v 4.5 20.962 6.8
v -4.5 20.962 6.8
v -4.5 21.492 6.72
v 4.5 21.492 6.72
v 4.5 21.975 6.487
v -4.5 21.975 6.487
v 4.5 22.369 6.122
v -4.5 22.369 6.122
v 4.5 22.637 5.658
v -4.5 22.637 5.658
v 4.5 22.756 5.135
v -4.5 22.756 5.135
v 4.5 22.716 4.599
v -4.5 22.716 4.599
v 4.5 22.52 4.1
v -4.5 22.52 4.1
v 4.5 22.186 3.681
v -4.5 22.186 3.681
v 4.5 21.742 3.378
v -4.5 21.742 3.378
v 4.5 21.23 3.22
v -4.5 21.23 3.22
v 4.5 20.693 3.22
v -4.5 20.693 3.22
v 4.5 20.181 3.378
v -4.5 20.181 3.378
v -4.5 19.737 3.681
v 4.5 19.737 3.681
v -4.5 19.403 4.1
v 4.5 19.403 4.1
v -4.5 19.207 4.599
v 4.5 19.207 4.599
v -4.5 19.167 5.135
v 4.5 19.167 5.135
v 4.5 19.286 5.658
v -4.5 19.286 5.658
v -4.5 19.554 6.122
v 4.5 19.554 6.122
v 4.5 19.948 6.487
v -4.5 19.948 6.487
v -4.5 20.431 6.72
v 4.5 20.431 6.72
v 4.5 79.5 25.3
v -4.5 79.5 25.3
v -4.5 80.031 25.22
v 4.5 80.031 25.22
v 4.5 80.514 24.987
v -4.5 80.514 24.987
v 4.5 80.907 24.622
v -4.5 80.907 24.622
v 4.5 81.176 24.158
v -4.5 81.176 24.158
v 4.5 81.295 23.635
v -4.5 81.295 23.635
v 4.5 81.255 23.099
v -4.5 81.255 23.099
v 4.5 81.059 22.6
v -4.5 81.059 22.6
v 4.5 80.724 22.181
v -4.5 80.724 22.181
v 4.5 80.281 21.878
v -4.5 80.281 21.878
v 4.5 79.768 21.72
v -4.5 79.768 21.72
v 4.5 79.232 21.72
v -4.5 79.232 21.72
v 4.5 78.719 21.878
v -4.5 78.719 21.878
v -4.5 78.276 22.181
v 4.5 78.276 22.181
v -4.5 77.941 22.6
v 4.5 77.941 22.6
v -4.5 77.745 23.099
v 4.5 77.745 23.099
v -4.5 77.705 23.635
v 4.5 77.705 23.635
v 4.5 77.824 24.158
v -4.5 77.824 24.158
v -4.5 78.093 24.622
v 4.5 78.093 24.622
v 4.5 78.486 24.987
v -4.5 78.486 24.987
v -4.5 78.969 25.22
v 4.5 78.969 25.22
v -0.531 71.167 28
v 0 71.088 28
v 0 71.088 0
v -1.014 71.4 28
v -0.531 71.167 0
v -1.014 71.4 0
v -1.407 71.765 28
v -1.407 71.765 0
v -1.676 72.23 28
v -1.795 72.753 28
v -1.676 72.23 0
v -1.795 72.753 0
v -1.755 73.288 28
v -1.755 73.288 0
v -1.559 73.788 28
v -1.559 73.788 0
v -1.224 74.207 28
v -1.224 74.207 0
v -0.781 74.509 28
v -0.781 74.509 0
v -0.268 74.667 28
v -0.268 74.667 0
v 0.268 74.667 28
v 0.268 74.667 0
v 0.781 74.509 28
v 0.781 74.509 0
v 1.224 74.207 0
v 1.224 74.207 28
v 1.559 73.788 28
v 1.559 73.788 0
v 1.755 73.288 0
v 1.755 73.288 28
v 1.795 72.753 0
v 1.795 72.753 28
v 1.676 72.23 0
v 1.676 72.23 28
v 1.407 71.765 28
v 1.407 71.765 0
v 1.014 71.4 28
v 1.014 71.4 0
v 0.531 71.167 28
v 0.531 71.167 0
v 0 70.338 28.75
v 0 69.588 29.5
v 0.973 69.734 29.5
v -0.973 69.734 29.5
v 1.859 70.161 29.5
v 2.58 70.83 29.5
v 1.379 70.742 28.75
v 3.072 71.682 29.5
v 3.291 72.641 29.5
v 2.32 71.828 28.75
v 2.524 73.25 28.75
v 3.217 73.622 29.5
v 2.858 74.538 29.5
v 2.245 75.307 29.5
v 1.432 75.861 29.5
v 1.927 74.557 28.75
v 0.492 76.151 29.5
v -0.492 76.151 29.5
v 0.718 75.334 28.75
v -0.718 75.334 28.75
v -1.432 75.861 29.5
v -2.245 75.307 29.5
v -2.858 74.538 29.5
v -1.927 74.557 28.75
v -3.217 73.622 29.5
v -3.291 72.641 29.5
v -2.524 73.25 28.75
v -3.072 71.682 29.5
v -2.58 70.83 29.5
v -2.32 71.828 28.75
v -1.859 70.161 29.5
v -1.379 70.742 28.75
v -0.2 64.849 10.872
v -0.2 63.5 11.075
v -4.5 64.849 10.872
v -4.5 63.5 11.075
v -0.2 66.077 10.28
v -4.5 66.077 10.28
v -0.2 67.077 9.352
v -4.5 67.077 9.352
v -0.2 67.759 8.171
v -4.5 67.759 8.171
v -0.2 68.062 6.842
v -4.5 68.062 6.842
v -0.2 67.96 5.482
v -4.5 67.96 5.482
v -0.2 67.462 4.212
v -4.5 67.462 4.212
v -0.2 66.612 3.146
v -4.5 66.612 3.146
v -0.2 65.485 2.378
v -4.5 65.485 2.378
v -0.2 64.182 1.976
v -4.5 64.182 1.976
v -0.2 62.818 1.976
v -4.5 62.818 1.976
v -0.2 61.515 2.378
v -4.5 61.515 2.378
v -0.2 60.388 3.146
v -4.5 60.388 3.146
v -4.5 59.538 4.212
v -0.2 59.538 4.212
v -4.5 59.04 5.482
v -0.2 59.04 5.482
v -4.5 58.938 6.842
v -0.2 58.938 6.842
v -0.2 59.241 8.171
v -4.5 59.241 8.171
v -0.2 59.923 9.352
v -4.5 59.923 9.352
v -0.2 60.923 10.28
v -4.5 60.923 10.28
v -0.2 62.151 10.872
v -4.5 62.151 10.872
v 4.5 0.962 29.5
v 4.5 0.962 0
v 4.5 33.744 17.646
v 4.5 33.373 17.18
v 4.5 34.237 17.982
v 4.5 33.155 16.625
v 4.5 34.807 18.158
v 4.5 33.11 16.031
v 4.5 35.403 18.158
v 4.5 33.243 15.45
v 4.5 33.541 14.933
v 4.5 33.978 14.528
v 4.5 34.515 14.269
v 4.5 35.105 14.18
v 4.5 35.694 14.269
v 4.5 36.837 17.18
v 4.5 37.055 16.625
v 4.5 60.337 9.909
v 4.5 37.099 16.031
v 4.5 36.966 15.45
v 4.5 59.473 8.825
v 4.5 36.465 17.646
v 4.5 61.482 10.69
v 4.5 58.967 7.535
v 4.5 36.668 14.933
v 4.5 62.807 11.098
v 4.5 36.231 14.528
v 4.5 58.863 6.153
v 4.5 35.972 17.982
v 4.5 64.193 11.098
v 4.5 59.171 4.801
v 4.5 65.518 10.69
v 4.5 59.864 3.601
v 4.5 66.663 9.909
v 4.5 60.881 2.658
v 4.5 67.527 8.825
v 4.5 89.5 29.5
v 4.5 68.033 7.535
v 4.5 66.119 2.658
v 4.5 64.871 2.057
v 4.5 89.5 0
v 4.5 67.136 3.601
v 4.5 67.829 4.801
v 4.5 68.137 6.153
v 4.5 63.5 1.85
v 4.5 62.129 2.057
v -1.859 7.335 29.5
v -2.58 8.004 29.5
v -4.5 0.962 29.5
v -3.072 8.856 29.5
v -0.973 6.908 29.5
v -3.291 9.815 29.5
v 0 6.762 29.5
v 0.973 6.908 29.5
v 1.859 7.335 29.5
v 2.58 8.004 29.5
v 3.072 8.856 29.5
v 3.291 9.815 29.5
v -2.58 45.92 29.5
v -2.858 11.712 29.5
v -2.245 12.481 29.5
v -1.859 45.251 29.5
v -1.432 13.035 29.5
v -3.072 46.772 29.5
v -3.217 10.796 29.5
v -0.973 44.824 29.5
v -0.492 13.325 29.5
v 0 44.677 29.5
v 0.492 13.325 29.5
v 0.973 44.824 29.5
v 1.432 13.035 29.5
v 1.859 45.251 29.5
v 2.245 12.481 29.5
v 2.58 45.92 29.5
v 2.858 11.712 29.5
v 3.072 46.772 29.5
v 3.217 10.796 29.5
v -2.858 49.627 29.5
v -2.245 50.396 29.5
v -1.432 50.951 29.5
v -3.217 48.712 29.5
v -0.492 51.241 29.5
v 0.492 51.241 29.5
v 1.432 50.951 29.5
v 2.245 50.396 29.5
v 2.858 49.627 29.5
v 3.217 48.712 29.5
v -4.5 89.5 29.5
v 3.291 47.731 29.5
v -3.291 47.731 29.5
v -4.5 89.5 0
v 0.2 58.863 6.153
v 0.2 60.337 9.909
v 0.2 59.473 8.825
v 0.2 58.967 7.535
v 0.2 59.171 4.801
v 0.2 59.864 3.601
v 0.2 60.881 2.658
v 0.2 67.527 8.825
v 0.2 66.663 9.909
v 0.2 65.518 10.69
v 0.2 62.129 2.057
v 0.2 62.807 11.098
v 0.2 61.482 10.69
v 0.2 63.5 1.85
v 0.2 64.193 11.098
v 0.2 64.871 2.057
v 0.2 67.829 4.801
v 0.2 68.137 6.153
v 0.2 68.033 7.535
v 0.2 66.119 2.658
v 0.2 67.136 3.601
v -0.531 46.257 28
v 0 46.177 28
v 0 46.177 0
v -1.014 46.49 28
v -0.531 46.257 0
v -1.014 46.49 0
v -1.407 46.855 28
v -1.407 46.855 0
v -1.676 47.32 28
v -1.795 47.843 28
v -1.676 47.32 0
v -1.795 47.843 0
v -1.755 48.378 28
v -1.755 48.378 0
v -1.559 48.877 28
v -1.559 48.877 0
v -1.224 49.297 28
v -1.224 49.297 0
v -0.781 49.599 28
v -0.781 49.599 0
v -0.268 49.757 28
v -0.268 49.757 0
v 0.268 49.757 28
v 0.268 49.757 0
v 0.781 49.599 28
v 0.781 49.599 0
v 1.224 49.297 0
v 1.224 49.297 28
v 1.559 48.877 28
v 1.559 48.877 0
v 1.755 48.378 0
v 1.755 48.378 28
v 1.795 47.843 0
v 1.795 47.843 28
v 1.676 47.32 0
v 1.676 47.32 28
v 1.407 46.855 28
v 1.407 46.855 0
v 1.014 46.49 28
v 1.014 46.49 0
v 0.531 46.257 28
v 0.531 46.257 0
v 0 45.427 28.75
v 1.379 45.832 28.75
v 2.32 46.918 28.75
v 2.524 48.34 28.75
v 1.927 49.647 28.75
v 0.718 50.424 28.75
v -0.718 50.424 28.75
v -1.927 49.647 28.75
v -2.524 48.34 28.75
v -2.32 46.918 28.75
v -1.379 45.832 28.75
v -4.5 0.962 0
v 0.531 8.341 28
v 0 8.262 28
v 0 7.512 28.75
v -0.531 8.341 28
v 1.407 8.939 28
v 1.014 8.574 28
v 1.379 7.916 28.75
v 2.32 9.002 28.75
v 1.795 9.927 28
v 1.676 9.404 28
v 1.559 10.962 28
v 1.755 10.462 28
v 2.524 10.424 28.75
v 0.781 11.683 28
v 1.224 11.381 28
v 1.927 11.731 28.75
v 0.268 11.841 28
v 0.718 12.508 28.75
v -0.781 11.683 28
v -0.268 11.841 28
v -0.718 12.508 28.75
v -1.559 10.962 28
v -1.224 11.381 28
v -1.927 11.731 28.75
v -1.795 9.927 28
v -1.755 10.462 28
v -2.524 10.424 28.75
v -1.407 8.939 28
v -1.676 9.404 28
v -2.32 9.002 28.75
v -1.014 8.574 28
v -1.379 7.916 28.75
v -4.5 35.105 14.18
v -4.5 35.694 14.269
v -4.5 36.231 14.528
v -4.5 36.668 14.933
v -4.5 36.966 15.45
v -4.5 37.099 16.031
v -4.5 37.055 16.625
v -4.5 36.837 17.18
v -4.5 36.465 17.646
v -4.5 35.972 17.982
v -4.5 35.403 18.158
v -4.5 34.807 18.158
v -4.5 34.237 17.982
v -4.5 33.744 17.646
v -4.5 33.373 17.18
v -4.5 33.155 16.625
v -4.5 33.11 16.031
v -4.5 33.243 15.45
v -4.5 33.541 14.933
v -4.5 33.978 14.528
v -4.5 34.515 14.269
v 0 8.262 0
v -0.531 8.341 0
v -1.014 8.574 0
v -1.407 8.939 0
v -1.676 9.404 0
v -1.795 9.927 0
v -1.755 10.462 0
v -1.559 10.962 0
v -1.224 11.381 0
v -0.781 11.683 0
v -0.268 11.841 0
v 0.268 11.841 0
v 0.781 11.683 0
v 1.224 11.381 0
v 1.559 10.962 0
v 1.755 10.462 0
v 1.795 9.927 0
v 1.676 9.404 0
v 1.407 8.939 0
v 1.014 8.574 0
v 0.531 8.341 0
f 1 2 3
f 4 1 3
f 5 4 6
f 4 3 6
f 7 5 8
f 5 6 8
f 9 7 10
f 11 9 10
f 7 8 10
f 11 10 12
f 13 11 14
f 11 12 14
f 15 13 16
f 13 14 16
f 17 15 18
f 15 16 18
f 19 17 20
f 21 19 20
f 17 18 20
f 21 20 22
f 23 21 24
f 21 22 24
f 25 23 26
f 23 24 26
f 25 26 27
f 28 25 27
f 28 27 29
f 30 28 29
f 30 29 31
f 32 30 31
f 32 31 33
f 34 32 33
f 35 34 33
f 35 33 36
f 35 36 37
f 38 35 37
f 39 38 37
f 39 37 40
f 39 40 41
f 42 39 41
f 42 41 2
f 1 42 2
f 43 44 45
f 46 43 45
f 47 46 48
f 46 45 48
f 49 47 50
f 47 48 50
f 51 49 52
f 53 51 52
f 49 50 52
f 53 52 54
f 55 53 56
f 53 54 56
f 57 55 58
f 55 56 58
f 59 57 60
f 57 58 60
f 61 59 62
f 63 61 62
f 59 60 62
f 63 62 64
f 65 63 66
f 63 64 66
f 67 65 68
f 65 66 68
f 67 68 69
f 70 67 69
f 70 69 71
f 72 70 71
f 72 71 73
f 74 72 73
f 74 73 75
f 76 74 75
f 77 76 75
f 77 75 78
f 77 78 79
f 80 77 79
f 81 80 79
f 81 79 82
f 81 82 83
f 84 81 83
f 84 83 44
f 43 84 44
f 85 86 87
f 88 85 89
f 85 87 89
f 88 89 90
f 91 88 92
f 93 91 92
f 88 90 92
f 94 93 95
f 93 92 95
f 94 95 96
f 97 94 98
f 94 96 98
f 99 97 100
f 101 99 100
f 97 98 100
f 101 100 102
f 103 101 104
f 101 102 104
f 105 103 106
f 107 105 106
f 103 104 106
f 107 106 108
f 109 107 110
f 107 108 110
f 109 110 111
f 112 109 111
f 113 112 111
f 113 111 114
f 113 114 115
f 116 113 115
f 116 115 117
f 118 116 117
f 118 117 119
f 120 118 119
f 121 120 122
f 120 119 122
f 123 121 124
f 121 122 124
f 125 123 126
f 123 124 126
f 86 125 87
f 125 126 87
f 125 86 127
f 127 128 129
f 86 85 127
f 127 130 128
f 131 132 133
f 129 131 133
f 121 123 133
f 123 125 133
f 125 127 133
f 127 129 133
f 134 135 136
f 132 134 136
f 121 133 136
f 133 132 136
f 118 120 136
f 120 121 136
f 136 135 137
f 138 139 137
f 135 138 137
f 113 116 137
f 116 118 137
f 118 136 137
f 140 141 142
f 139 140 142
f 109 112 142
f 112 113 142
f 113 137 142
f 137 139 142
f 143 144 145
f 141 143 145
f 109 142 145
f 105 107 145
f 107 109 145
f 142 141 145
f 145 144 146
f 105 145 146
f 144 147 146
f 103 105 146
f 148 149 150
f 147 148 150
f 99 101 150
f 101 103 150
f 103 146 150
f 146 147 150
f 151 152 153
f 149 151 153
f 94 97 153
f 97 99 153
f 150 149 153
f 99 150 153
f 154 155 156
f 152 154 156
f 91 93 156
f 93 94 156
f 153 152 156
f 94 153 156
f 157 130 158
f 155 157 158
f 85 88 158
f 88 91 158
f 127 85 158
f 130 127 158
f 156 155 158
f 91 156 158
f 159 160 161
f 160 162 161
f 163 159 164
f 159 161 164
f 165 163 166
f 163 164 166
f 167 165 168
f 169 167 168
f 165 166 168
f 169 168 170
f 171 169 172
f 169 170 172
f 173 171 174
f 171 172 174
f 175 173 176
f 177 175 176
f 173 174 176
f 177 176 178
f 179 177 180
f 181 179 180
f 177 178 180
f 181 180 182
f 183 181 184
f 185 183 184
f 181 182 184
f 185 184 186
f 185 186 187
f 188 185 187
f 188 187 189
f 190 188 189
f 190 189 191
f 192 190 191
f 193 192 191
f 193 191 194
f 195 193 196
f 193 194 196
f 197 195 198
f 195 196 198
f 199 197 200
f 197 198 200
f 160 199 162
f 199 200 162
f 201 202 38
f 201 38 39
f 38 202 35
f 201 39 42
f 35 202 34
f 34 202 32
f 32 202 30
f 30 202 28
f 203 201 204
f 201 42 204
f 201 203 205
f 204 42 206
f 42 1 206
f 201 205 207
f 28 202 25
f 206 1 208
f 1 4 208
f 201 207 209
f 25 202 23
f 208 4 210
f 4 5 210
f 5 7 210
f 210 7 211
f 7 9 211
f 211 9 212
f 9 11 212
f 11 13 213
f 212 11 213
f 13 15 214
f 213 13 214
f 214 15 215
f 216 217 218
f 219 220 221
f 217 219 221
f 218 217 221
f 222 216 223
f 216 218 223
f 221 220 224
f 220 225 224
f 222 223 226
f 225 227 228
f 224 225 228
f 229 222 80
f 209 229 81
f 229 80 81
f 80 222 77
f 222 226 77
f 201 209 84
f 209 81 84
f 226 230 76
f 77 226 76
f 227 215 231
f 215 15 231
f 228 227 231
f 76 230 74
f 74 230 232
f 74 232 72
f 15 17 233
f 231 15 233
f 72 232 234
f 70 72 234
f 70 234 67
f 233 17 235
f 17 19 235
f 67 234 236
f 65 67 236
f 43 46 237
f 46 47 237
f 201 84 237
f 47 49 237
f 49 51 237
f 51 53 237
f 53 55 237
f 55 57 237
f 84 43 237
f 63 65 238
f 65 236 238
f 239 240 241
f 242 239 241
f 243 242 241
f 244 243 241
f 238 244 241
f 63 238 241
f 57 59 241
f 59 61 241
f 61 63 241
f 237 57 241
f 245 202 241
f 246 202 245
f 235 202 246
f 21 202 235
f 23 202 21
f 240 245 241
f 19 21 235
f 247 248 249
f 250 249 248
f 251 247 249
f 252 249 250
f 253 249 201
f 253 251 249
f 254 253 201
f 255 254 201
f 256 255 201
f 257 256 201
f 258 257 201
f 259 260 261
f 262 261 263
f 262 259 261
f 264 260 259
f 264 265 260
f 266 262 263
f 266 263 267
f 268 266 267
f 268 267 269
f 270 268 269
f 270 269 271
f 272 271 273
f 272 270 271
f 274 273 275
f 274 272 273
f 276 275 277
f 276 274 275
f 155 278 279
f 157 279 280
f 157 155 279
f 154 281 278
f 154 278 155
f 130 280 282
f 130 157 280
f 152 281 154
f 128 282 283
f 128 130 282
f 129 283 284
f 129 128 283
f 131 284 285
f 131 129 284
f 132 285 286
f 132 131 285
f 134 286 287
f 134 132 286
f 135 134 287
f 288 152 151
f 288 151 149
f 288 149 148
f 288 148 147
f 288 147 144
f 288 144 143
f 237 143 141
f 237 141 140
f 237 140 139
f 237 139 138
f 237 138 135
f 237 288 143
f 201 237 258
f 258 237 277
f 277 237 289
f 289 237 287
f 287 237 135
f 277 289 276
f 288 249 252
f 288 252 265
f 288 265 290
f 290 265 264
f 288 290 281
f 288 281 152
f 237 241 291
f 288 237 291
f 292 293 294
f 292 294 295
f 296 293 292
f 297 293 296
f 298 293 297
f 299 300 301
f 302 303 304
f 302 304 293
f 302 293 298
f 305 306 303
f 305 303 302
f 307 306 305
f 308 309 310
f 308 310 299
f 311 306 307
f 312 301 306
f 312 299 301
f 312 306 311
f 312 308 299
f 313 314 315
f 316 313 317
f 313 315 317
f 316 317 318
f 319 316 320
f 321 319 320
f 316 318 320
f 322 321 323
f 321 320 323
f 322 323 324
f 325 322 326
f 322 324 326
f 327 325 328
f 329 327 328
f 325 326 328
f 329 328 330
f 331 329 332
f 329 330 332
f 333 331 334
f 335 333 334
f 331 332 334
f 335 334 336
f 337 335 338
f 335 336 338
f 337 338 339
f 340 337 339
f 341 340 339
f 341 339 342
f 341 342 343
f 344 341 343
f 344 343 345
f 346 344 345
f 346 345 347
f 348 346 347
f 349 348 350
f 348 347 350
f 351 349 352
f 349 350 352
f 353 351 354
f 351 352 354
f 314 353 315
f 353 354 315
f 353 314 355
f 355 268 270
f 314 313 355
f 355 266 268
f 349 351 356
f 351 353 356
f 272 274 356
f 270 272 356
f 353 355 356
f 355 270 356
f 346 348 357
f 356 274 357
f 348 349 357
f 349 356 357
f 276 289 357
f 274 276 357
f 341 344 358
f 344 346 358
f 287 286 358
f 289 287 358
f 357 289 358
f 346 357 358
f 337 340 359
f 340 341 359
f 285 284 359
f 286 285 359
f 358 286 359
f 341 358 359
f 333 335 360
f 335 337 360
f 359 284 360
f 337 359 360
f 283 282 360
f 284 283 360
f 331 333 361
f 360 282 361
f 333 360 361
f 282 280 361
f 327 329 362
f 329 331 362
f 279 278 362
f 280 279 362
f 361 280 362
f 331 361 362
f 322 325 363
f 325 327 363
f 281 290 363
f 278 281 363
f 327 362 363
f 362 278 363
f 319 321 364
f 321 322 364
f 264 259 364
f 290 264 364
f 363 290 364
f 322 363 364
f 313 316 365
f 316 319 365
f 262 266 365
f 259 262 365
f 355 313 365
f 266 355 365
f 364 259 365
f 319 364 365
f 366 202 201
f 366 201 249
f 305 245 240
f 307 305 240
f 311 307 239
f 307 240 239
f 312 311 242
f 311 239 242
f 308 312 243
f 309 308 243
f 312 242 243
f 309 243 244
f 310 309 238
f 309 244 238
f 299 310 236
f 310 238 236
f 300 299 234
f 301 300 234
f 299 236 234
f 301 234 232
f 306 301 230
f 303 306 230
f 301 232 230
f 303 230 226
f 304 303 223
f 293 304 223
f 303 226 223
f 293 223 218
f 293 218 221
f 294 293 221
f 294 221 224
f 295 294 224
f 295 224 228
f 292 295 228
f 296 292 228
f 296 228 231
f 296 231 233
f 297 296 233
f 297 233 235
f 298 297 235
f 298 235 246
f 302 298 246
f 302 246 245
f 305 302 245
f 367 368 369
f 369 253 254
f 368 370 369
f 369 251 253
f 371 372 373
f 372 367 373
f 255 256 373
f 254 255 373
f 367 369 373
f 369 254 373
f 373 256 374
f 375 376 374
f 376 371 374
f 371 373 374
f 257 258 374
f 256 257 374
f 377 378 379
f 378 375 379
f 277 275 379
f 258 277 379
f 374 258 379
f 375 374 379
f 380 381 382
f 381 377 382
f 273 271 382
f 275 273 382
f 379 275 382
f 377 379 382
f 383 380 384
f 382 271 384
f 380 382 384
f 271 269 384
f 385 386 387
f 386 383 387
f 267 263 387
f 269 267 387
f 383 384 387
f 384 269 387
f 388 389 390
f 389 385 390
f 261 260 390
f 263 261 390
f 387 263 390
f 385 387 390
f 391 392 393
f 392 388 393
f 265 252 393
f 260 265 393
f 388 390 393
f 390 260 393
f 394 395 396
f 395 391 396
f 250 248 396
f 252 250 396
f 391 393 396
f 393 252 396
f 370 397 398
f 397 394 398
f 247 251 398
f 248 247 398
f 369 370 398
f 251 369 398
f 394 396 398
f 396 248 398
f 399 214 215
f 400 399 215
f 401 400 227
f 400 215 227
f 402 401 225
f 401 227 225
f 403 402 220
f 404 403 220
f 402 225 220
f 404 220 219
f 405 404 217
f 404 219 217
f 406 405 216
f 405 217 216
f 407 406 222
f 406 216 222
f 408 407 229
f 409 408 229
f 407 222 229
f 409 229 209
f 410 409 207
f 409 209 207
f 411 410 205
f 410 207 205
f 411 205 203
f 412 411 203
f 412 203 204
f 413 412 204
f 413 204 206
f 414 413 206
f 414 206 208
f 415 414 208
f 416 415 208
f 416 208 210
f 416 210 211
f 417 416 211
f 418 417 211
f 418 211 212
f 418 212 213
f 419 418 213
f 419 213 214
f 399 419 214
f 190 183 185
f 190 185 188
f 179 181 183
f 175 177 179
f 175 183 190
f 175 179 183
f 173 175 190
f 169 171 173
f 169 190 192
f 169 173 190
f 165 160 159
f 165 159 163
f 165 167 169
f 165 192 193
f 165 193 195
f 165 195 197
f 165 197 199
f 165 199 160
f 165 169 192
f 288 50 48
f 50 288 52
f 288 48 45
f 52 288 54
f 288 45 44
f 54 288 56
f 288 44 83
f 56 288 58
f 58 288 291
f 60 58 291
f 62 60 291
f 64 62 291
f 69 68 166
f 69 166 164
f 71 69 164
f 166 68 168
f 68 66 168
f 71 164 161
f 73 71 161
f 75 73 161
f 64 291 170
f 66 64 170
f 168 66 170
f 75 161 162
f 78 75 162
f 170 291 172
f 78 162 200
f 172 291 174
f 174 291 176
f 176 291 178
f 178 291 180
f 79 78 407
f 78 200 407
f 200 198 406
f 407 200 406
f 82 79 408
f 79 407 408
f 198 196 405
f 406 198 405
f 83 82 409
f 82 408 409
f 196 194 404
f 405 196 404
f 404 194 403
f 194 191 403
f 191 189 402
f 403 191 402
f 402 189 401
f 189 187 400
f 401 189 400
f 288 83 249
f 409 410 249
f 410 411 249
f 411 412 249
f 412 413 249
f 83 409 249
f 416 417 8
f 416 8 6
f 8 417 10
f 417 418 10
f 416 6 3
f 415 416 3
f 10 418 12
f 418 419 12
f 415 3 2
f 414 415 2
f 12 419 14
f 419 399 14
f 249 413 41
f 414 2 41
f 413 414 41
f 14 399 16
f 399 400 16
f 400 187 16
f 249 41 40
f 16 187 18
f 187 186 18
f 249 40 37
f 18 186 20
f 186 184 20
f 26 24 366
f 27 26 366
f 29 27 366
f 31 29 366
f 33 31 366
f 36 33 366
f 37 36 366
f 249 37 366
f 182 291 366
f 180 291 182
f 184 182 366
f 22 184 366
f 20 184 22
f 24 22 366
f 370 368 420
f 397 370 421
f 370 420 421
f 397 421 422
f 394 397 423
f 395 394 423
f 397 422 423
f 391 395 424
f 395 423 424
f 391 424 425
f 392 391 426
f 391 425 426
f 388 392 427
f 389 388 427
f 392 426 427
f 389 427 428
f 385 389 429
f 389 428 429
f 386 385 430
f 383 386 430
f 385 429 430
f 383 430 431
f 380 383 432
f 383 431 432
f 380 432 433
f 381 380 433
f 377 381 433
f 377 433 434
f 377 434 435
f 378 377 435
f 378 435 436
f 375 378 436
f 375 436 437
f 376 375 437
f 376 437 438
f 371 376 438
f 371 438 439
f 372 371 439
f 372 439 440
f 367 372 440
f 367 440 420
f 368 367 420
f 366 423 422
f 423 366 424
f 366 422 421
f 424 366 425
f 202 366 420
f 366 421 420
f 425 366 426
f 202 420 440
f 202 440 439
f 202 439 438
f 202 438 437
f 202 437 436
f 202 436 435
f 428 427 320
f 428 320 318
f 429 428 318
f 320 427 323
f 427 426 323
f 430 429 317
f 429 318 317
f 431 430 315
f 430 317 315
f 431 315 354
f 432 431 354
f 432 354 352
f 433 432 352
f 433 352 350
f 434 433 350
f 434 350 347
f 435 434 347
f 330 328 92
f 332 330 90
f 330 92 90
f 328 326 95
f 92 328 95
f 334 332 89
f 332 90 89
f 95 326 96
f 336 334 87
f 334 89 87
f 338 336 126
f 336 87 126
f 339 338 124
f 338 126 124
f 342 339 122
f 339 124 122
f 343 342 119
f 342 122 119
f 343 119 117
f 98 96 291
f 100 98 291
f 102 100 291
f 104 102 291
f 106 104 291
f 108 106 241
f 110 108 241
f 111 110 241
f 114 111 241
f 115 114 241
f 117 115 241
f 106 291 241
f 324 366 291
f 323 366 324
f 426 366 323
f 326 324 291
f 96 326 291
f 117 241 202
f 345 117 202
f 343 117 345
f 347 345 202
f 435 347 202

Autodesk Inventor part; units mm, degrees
ref_plane "YZ Plane" through (0, 0, 0) normal (1, 0, 0) x (0, 1, 0)
ref_plane "XZ Plane" through (0, 0, 0) normal (0, 1, 0) x (-1, 0, 0)
ref_plane "Work Plane1" through (0, 0, 0) normal (0, 0, 1) x (1, 0, 0)
sketch "Sketch1" plane through (0, 0, 0) normal (0, 0, 1) x (1, 0, 0)
  line L0 (-74, -73.5) -> (-74, -89.5) projected
  line L1 (-74, -89.5) -> (74, -89.5) projected
  line L2 (74, -89.5) -> (74, -73.5) projected
  line L3 (74, -73.5) -> (89, -73.5) projected
  line L4 (89, -73.5) -> (89, 37.5) projected
  line L5 (89, 37.5) -> (22.5, 37.5) projected
  line L6 (22.5, 37.5) -> (22.5, 89.5) projected
  line L7 (22.5, 89.5) -> (16.5, 89.5) projected
  line L8 (16.5, 89.5) -> (16.5, 37.5) projected
  line L9 (16.5, 37.5) -> (4.5, 37.5) projected
  line L10 (4.5, 37.5) -> (4.5, 89.5) projected
  line L11 (4.5, 89.5) -> (-4.5, 89.5) projected
  line L12 (-4.5, 89.5) -> (-4.5, 37.5) projected
  line L13 (-4.5, 37.5) -> (-16.5, 37.5) projected
  line L14 (-16.5, 37.5) -> (-16.5, 89.5) projected
  line L15 (-16.5, 89.5) -> (-22.5, 89.5) projected
  line L16 (-22.5, 89.5) -> (-22.5, 37.5) projected
  line L17 (-22.5, 37.5) -> (-89, 37.5) projected
  line L18 (-89, 37.5) -> (-89, -73.5) projected
  line L19 (-89, -73.5) -> (-74, -73.5) projected
  circle A0 centre (-29.2, 3.1615) radius 1.8 projected
  line L20 (-22.5, 13.4539) -> (-22.5, 0.9615) projected
  line L21 (-27.2, 13.4539) -> (-22.5, 13.4539) projected
  line L22 (-27.2, 13.4539) -> (-27.2, 5.7703) projected
  line L23 (-27.2, 5.7703) -> (-32.2, 5.7703) projected
  line L24 (-32.2, 0.9615) -> (-32.2, 5.7703) projected
  line L25 (-32.2, 0.9615) -> (-22.5, 0.9615) projected
  circle A1 centre (29.2, 3.1615) radius 1.8 projected
  line L26 (22.5, 13.4539) -> (22.5, 0.9615) projected
  line L27 (32.2, 0.9615) -> (22.5, 0.9615) projected
  line L28 (32.2, 0.9615) -> (32.2, 5.7703) projected
  line L29 (27.2, 5.7703) -> (32.2, 5.7703) projected
  line L30 (27.2, 13.4539) -> (27.2, 5.7703) projected
  line L31 (27.2, 13.4539) -> (22.5, 13.4539) projected
  line L32 (-4.5, 89.5) -> (4.5, 89.5)
  line L33 (4.5, 89.5) -> (4.5, 0.9615)
  line L34 (4.5, 0.9615) -> (-4.5, 0.9615)
  line L35 (-4.5, 0.9615) -> (-4.5, 89.5)
  point P0 (0, 0)
ref_plane "Work Plane2" through (-88.5, 89.5, 29.5) normal (0, 0, 1) x (1, 0, 0)
extrude "Extrusion1" add sketch "Sketch1" along normal up to surface (29.5 mm away) contours L12 L11 L10 L33 L34 L35
sketch "Sketch2" plane through (4.5, 0.9615, 0) normal (1, 0, 0) x (0, 0, -1)
  circle A0 centre (-16.1803, 34.1432) radius 2 projected
  point P0 (0, -0.9615)
extrude "Extrusion2" cut sketch "Sketch2" against normal up to next
sketch "Sketch3" plane through (4.5, 0.9615, 0) normal (1, 0, 0) x (0, 0, -1)
  circle A0 centre (-6.5, 62.5385) radius 5.5 projected
  circle A1 centre (-6.5, 62.5385) radius 4.5
  circle A2 centre (-6.5, 62.5385) radius 4.65
  point P0 (0, -0.9615)
  dimension "d4" = 9
  dimension "d5" = 0.15
extrude "Extrusion3" cut sketch "Sketch3" against normal blind 4.3 contours A1 | A2
sketch "Sketch4" plane through (-4.5, 0.9615, 0) normal (-1, 0, 0) x (0, 0, 1)
  circle A0 centre (6.5, 62.5385) radius 1.2295 projected
  circle A1 centre (6.5, 62.5385) radius 4.65 projected
  circle A2 centre (6.5, 62.5385) radius 4.575
  point P0 (0, -0.9615)
  dimension "d8" = 9.15
extrude "Extrusion4" cut sketch "Sketch4" against normal blind 4.3 contours A0 | A2
sketch "Sketch6" plane through (-4.5, 0.9615, 0) normal (-1, 0, 0) x (0, 0, 1)
  circle A0 centre (5, 20) radius 1.8 projected
  circle A1 centre (23.5, 78.5385) radius 1.8 projected
  point P0 (0, -0.9615)
extrude "Extrusion5" cut sketch "Sketch6" against normal up to surface (9 mm away)
sketch "Sketch7" plane through (-4.5, 0.9615, 29.5) normal (0, 0, 1) x (1, 0, 0)
  line L0 (9, 21.8) -> (9, 18.2) projected
  line L1 (0, 18.2) -> (0, 21.8) projected
  line L2 (0, 32.1432) -> (0, 36.1432) projected
  line L3 (9, 36.1432) -> (9, 32.1432) projected
  line L4 (4.3, 57.9635) -> (4.3, 67.1135) projected
  line L5 (0, 57.9635) -> (0, 67.1135) projected
  line L6 (0, 76.7385) -> (0, 80.3385) projected
  line L7 (9, 88.5385) -> (9, 0) projected
  line L8 (0, 80.3385) -> (9, 80.3385)
  line L9 (9, 80.3385) -> (9, 76.7385)
  line L10 (9, 76.7385) -> (0, 76.7385)
  line L11 (0, 76.7385) -> (0, 80.3385)
  line L12 (9, 57.8885) -> (4.7, 57.8885) projected
  line L13 (0, 67.1135) -> (9, 67.1135)
  line L14 (9, 67.1135) -> (9, 57.8885)
  line L15 (9, 57.8885) -> (0, 57.8885)
  line L16 (0, 57.8885) -> (0, 67.1135)
  line L17 (0, 36.1432) -> (9, 36.1432)
  line L18 (9, 36.1432) -> (9, 32.1432)
  line L19 (9, 32.1432) -> (0, 32.1432)
  line L20 (0, 32.1432) -> (0, 36.1432)
  line L21 (9, 0) -> (0, 0) projected
  line L22 (9, 88.5385) -> (9, 0) projected
  line L23 (0, 88.5385) -> (9, 88.5385) projected
  line L24 (0, 0) -> (0, 88.5385) projected
  line L25 (0, 18.2) -> (9, 18.2)
  line L26 (9, 18.2) -> (9, 21.8)
  line L27 (9, 21.8) -> (0, 21.8)
  line L28 (0, 21.8) -> (0, 18.2)
  line L29 (0, 18.2) -> (9, 0)
  line L30 (0, 0) -> (9, 18.2)
  line L31 (9, 36.1432) -> (0, 57.8885)
  line L32 (0, 36.1432) -> (9, 57.8885)
  line L33 (0, 76.7385) -> (9, 67.1135)
  line L34 (0, 67.1135) -> (9, 76.7385)
  point P0 (4.5, -0.9615)
  point P1 (4.5, 9.1)
  point P2 (4.5, 47.0158)
  point P3 (4.5, 71.926)
hole "Hole2" at (0, 10.0615, 29.5) at (0, 47.9774, 29.5) at (0, 72.8875, 29.5) direction (0, 0, -1) diameter 3.6 end through all countersink diameter 6.6 countersink angle 90 clearance for "Countersunk Flat Head Screw ISO 2009/7046" size "M3" standard "ISO"
properties part number "middle_gaer_holder"
